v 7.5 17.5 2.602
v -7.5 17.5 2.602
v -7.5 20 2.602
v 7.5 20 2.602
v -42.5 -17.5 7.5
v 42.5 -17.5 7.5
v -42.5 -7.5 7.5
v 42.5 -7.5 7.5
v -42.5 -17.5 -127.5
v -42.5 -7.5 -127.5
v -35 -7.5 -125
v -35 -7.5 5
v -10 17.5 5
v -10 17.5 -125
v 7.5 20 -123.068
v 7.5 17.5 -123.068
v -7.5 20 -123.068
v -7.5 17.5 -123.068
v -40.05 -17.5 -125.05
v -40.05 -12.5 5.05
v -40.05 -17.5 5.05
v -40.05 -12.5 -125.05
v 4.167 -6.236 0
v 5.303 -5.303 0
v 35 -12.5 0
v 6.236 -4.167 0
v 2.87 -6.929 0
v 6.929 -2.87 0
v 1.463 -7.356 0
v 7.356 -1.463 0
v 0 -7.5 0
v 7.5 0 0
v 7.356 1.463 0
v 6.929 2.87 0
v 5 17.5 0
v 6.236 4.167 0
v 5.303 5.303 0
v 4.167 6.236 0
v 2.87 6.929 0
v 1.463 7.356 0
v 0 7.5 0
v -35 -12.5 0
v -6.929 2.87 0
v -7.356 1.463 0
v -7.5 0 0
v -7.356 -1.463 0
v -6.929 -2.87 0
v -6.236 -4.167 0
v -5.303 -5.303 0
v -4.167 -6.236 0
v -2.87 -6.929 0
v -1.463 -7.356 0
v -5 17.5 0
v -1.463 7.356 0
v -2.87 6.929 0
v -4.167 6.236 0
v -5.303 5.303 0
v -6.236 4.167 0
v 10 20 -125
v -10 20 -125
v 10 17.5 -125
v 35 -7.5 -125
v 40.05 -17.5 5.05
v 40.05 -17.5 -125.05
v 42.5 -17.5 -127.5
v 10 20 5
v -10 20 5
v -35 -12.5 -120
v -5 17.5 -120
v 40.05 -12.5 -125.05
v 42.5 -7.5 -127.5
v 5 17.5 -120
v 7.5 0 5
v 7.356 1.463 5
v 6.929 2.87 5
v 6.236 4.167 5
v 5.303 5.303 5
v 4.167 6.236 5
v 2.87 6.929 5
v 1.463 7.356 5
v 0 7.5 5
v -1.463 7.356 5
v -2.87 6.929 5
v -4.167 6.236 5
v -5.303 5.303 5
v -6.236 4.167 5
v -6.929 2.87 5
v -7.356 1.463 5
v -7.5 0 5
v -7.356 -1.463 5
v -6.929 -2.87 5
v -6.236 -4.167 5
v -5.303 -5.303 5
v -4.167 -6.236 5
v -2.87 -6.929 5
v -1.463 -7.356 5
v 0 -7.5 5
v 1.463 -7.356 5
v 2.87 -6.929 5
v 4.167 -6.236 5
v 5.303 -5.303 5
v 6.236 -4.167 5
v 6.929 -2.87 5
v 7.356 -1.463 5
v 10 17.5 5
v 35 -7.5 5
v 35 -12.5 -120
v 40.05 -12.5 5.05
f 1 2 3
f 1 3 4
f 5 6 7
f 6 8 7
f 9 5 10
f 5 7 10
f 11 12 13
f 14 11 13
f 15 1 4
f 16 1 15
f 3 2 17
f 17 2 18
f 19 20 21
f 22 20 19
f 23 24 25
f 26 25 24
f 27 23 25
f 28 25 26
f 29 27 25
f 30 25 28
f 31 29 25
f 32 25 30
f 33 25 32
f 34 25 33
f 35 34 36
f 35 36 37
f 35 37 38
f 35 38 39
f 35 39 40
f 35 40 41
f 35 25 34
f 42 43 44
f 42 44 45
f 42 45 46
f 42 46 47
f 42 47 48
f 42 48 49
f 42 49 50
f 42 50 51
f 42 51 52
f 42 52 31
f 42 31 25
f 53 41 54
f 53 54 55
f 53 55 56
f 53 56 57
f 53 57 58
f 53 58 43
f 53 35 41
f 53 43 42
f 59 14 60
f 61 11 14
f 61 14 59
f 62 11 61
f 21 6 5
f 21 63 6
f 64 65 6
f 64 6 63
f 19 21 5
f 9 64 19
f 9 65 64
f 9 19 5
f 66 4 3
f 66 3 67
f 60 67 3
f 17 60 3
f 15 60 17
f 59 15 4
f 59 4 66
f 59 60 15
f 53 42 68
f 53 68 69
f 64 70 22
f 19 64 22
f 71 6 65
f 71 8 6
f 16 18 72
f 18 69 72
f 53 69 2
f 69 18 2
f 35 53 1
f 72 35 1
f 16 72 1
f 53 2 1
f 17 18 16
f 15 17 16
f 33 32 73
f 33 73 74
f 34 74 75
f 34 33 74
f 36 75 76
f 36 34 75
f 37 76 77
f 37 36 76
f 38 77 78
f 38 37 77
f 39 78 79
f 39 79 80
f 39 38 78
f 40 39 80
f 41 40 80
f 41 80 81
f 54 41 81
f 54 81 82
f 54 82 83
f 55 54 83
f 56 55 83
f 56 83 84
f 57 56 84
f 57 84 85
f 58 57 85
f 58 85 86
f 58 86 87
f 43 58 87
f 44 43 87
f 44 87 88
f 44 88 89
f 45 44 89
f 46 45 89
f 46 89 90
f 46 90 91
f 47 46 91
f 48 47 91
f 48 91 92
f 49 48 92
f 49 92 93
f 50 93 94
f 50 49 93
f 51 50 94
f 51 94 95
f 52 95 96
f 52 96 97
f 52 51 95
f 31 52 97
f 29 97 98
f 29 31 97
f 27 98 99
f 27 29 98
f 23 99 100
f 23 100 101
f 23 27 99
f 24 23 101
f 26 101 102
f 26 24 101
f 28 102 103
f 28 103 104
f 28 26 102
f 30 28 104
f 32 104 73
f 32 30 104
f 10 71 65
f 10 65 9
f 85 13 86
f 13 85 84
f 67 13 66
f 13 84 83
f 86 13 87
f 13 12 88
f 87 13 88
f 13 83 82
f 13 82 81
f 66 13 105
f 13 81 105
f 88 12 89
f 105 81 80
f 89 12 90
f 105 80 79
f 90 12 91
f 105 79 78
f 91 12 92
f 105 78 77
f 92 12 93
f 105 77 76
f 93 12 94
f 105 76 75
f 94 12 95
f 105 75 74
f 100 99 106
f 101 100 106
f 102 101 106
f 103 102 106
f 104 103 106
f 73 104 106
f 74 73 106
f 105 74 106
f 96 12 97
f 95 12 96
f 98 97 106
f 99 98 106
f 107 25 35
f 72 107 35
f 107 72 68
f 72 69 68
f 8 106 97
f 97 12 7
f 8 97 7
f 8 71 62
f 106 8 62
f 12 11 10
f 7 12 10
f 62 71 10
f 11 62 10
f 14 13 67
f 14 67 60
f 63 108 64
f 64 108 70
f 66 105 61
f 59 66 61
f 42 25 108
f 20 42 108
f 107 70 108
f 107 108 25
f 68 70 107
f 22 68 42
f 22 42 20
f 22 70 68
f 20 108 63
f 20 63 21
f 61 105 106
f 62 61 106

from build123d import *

# Parameters (mm, degrees)
SKETCH2_R            = 7.5
BOSS_EXTRUDE1_DEPTH  = 5
BOSS_EXTRUDE4_DEPTH  = 120
BOSS_EXTRUDE5_DEPTH  = 5
SKETCH7_W            = 85
SKETCH7_H            = 135
SKETCH7_W_2          = 70
SKETCH7_H_2          = 120
BOSS_EXTRUDE6_DEPTH  = 5
SKETCH10_W           = 85
SKETCH10_H           = 135
SKETCH10_W_2         = 80.1
SKETCH10_H_2         = 130.1
BOSS_EXTRUDE9_DEPTH  = 5
SKETCH11_W           = 20
SKETCH11_H           = 130
SKETCH11_W_2         = 15
SKETCH11_H_2         = 125.670447934
BOSS_EXTRUDE10_DEPTH = 2.5


with BuildPart() as part:
    # Sketch2 → Boss-Extrude1 (new body)
    with BuildSketch(Plane.XY):
        Polygon((-10, 17.5), (10, 17.5), (40, -12.5), (-40, -12.5), align=None)
        Circle(SKETCH2_R, mode=Mode.SUBTRACT)
    extrude(amount=BOSS_EXTRUDE1_DEPTH)

    # Sketch5 → Boss-Extrude4 (add)
    with BuildSketch(Plane(origin=(0, 0, 0), x_dir=(-1, 0, 0), z_dir=(0, 0, -1))):
        Polygon((-10, 17.5), (-40, -12.5), (-35, -12.5), (-5, 17.5), align=None)
        Polygon((10, 17.5), (40, -12.5), (35, -12.5), (5, 17.5), align=None)
    extrude(amount=BOSS_EXTRUDE4_DEPTH)

    # Sketch6 → Boss-Extrude5 (add)
    with BuildSketch(Plane(origin=(0, 0, -120), x_dir=(-1, 0, 0), z_dir=(0, 0, -1))):
        Polygon((-40, -12.5), (40, -12.5), (10, 17.5), (-10, 17.5), align=None)
    extrude(amount=BOSS_EXTRUDE5_DEPTH)

    # Sketch7 → Boss-Extrude6 (add)
    with BuildSketch(Plane(origin=(0, -12.5, 0), x_dir=(-1, 0, 0), z_dir=(0, -1, 0))):
        with Locations((0, 60)):
            Rectangle(SKETCH7_W, SKETCH7_H)
        with Locations((0, 60)):
            Rectangle(SKETCH7_W_2, SKETCH7_H_2, mode=Mode.SUBTRACT)
    extrude(amount=-BOSS_EXTRUDE6_DEPTH)

    # Sketch10 → Boss-Extrude9 (add)
    with BuildSketch(Plane(origin=(0, -12.5, 0), x_dir=(-1, 0, 0), z_dir=(0, -1, 0))):
        with Locations((0, 60)):
            Rectangle(SKETCH10_W, SKETCH10_H)
        with Locations((0, 60)):
            Rectangle(SKETCH10_W_2, SKETCH10_H_2, mode=Mode.SUBTRACT)
    extrude(amount=BOSS_EXTRUDE9_DEPTH)

    # Sketch11 → Boss-Extrude10 (add)
    with BuildSketch(Plane(origin=(0, 17.5, 0), x_dir=(1, 0, 0), z_dir=(0, 1, 0))):
        with Locations((0, 60)):
            Rectangle(SKETCH11_W, SKETCH11_H)
        with Locations((0, 60.23315482)):
            Rectangle(SKETCH11_W_2, SKETCH11_H_2, mode=Mode.SUBTRACT)
    extrude(amount=BOSS_EXTRUDE10_DEPTH)


solid = part.part
